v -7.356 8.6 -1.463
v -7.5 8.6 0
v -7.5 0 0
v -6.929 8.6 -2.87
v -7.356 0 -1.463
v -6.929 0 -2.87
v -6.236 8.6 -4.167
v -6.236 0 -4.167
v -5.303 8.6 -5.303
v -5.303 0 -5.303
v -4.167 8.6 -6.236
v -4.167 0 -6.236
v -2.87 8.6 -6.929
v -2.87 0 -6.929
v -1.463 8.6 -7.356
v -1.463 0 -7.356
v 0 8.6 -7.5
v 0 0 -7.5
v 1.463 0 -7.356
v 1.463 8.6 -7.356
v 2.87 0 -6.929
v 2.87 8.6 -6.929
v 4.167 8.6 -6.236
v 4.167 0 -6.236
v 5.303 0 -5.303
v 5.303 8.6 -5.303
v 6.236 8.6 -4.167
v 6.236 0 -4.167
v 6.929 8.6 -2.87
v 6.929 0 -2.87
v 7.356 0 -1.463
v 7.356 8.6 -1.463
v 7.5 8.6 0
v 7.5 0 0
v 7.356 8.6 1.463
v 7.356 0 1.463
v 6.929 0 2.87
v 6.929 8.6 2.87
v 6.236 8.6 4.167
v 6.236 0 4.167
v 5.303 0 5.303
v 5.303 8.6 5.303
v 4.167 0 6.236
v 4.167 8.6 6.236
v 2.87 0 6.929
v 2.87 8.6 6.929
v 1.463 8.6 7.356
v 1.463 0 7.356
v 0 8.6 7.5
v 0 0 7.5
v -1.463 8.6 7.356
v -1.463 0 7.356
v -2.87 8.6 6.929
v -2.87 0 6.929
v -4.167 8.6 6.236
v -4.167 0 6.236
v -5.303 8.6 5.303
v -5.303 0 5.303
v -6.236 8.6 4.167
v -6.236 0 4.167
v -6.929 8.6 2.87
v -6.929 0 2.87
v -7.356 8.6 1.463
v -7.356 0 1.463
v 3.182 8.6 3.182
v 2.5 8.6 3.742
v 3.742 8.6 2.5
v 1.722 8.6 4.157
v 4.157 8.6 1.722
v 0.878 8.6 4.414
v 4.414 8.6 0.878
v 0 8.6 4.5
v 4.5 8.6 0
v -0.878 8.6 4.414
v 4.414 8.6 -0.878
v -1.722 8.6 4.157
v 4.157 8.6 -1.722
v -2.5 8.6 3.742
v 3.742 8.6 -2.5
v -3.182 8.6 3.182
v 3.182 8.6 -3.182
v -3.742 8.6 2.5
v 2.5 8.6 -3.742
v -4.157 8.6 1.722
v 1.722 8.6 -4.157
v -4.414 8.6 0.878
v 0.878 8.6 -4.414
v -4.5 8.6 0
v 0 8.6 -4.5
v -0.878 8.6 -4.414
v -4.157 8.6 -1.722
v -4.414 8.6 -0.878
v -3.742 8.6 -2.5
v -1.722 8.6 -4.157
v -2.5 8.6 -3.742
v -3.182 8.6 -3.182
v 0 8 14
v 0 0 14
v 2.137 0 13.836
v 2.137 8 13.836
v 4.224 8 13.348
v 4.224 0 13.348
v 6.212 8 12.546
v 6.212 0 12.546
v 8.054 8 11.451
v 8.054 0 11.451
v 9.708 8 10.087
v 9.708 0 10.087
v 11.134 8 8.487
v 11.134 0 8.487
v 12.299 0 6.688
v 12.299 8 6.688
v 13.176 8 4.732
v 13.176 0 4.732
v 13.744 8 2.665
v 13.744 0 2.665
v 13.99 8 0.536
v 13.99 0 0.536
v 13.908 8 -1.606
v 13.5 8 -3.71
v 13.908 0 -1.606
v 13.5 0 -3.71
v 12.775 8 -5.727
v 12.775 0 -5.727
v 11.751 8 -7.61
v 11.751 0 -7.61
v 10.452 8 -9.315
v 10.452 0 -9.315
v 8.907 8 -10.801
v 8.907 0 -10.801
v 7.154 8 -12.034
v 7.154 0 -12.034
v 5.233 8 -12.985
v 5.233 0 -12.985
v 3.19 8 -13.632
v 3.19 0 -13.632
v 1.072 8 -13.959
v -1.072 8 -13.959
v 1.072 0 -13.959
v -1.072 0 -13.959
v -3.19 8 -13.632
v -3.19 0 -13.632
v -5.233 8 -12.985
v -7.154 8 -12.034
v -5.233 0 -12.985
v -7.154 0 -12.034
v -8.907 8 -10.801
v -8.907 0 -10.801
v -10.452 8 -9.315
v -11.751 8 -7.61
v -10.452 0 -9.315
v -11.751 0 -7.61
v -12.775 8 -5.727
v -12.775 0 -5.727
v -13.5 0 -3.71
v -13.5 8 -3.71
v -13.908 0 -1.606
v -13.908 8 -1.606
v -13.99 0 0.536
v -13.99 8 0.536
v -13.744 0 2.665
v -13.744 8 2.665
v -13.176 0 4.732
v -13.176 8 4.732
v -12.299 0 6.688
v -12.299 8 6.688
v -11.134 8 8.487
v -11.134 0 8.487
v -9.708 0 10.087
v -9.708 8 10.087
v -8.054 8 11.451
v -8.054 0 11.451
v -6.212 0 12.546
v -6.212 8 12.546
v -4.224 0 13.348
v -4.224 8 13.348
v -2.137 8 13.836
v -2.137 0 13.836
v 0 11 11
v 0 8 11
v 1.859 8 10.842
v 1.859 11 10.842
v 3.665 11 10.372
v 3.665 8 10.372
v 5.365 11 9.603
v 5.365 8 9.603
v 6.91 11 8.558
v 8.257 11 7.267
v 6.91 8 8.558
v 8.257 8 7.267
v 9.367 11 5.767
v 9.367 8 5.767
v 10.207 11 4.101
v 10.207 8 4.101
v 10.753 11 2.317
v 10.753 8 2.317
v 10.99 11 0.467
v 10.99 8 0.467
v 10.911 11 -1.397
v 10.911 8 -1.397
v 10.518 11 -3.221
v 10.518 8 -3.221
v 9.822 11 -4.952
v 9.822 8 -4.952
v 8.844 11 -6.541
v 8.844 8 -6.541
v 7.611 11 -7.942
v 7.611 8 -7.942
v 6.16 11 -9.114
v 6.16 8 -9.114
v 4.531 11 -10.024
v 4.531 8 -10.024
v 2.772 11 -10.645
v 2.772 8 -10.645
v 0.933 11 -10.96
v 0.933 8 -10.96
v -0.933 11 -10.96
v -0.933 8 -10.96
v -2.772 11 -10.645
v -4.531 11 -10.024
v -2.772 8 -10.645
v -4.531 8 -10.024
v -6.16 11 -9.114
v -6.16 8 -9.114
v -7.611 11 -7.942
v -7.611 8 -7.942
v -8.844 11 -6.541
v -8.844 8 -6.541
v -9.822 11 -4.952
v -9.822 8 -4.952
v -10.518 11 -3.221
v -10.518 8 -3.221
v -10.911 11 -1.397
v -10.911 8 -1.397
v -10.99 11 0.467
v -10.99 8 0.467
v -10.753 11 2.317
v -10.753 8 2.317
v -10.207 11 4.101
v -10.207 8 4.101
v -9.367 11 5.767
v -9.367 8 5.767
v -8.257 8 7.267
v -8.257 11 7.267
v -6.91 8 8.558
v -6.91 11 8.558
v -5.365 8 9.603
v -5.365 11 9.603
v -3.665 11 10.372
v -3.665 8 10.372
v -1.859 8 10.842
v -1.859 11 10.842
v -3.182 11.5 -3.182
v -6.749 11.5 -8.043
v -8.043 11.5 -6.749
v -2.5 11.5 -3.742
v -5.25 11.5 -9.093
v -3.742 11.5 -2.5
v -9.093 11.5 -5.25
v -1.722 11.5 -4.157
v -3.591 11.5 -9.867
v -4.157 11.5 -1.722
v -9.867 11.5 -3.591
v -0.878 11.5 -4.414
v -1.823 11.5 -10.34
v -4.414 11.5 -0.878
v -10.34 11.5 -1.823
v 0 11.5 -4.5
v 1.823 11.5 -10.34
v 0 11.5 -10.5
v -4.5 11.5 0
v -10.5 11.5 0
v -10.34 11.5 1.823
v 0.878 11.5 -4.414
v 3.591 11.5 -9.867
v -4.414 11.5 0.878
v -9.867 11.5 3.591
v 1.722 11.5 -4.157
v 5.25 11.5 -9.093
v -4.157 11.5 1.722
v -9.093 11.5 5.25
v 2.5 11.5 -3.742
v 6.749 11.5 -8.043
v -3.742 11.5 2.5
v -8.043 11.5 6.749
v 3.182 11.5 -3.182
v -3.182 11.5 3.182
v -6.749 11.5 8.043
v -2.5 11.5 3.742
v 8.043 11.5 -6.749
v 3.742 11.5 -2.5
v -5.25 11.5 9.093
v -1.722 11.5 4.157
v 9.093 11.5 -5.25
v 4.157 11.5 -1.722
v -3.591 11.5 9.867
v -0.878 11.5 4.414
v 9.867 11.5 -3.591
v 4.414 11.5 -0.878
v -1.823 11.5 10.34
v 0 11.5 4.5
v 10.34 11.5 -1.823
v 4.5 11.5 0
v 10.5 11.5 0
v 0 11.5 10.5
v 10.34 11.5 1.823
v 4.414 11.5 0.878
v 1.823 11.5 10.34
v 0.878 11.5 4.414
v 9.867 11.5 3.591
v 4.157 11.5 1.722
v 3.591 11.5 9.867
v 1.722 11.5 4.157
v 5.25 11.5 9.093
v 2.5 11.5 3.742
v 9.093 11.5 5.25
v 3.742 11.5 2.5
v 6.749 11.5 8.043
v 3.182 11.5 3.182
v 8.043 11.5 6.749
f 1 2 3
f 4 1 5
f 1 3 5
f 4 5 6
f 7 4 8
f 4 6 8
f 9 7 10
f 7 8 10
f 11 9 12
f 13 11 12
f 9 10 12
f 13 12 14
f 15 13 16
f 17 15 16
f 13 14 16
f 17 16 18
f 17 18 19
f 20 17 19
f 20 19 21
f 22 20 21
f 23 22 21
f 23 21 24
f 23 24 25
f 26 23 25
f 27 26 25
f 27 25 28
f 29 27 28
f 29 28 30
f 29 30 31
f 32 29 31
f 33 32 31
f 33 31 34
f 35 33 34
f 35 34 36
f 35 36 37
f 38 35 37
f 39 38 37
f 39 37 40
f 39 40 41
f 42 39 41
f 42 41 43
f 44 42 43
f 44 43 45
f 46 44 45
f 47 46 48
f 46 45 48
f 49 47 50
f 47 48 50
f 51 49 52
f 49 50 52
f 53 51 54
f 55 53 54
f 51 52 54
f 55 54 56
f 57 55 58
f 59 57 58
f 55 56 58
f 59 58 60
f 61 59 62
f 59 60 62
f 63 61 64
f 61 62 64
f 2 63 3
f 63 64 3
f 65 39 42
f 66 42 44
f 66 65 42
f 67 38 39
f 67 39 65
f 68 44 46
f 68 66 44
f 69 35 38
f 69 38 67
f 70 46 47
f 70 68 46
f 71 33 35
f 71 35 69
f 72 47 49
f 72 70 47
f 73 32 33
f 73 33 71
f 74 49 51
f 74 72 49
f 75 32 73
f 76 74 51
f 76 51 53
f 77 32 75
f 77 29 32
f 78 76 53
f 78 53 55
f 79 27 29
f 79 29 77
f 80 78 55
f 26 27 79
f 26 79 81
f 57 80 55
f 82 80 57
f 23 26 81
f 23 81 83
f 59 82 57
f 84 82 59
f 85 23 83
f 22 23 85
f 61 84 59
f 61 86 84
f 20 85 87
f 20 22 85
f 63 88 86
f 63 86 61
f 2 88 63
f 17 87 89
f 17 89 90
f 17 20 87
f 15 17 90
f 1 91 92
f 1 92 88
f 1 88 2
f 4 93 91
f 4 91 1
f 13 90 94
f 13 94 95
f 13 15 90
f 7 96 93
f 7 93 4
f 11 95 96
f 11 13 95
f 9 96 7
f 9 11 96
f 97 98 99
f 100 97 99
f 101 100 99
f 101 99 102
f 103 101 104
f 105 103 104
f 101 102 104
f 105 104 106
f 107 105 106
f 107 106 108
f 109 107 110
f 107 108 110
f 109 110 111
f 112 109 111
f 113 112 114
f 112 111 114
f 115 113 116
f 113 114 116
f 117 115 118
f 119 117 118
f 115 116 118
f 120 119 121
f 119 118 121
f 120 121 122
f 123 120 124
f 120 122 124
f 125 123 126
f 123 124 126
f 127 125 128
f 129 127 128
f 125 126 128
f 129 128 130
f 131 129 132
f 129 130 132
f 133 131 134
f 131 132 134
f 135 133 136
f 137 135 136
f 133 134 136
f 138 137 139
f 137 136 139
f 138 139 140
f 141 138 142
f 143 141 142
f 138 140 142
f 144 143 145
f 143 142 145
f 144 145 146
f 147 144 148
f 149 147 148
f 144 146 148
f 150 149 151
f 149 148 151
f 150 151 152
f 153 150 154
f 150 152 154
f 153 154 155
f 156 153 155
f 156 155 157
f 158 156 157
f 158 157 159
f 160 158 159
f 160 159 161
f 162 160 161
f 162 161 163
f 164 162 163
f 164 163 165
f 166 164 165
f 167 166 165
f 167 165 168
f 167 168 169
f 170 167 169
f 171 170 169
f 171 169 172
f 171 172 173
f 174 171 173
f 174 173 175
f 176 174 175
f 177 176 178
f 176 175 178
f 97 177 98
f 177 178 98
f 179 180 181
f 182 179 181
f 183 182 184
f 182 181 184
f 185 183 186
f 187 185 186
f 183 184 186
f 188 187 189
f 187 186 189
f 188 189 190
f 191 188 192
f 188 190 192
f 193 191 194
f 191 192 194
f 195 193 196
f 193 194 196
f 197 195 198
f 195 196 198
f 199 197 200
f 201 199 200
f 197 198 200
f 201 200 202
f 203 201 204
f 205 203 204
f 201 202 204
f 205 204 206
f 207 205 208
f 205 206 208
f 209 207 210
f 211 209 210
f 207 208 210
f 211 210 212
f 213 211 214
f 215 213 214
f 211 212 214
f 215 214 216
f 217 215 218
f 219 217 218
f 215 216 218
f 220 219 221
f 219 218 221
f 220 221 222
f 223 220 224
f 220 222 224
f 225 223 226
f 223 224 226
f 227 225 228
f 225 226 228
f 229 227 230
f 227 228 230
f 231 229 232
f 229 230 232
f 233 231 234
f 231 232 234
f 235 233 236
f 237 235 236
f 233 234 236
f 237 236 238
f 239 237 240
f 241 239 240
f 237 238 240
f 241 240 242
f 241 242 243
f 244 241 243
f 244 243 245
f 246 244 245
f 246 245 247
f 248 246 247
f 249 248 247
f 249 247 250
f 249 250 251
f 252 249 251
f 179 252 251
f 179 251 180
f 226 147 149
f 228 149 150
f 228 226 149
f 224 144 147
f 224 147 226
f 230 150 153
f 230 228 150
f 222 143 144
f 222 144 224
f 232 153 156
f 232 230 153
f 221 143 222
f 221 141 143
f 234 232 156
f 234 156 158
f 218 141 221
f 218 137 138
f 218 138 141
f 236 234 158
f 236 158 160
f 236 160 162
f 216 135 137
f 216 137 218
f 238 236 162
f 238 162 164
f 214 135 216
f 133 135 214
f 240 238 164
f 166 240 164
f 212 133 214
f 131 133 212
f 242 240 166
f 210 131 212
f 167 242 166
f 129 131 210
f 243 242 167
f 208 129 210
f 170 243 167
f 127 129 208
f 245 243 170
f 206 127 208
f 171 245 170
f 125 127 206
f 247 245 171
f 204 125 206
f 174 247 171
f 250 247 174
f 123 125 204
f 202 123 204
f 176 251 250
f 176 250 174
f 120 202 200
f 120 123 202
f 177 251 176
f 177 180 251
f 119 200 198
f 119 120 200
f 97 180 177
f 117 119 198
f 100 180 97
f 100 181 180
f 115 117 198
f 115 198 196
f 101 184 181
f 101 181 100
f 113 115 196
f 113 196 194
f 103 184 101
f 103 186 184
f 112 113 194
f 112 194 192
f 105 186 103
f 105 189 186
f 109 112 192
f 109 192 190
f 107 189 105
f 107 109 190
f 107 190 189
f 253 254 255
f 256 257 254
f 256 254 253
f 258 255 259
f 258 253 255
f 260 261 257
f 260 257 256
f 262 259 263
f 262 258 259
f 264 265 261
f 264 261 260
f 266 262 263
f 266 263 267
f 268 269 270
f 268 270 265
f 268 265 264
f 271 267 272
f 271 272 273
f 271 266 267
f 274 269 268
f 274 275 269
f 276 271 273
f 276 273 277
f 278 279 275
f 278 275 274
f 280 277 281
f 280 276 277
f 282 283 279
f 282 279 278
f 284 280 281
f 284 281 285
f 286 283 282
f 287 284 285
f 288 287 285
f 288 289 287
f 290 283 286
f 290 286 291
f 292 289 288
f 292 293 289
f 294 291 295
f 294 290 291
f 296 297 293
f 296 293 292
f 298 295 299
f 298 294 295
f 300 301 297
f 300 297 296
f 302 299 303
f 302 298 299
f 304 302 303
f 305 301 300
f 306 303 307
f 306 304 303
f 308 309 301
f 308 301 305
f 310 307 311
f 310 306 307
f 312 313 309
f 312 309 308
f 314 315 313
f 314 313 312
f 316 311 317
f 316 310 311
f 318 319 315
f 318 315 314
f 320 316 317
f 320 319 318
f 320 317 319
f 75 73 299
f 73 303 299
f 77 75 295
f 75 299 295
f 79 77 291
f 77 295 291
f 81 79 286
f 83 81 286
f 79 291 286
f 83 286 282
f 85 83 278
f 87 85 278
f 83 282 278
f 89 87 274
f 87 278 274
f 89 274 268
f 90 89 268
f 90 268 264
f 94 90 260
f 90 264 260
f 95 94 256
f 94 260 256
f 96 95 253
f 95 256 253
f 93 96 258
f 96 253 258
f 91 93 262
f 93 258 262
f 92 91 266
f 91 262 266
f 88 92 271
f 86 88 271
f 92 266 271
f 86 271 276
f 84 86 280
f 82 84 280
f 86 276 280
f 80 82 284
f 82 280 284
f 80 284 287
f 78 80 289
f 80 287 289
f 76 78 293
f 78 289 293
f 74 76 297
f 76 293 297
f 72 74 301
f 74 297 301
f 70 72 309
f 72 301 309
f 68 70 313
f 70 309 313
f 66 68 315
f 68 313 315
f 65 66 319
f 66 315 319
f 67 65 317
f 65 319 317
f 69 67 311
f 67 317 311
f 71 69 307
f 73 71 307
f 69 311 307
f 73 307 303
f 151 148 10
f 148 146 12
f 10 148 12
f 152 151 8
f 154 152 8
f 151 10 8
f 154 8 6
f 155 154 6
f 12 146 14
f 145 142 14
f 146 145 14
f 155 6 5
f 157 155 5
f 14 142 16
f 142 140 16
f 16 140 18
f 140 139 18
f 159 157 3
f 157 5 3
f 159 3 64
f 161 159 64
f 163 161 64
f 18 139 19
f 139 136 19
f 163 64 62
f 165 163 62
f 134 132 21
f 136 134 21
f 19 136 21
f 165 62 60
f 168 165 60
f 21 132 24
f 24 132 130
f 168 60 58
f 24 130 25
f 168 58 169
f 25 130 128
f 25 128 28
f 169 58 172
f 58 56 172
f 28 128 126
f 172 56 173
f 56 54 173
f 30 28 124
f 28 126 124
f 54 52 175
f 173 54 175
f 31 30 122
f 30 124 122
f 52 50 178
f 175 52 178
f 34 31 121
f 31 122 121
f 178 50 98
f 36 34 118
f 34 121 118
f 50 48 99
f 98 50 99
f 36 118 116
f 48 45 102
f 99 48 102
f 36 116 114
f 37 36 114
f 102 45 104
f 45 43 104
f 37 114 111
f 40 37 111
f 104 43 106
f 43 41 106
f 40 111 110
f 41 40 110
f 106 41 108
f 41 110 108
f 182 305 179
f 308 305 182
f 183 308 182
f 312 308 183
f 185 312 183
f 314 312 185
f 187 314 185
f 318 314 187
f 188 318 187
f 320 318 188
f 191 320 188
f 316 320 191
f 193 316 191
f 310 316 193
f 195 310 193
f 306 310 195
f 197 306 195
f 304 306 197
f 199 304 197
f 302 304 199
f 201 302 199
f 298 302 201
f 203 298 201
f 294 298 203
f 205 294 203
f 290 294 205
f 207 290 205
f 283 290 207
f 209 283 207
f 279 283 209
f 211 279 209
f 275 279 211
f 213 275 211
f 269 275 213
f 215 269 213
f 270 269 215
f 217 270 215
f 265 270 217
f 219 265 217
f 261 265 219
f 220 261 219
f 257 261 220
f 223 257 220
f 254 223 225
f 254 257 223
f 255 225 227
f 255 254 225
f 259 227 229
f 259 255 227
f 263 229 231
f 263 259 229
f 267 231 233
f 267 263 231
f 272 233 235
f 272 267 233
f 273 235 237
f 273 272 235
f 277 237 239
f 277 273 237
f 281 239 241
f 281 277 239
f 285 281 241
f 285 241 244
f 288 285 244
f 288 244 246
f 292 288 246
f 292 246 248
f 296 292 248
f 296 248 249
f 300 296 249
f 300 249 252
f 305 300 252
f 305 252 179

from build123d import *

# Parameters (mm, degrees)
SKETCH_1_R                   = 14
EXTRUDE_1_DEPTH              = 8
SKETCH_2_R                   = 11
EXTRUDE_2_DEPTH              = 3.5
HOLE_WIZARD_M8_1_D           = 9
HOLE_WIZARD_M8_1_CBORE_D     = 15
HOLE_WIZARD_M8_1_CBORE_DEPTH = 8.6
CHAMFER_1_SIZE               = 0.5


with BuildPart() as part:
    # 草圖1 → 填料-伸長1 (new body)
    with BuildSketch(Plane(origin=(0, 0, 0), x_dir=(1, 0, 0), z_dir=(0, 1, 0))):
        with Locations(Location((0, 0, 0), (0, 0, 270))):
            Circle(SKETCH_1_R)
    extrude(amount=EXTRUDE_1_DEPTH)

    # 草圖2 → 填料-伸長2 (add)
    with BuildSketch(Plane(origin=(0, 8, 0), x_dir=(1, 0, 0), z_dir=(0, 1, 0))):
        with Locations(Location((0, 0, 0), (0, 0, 270))):
            Circle(SKETCH_2_R)
    extrude(amount=EXTRUDE_2_DEPTH)

    # M8 六角承窩頭蓋螺釘的柱孔1 (through all)
    with Locations(Plane(origin=(0, 0, 0), x_dir=(-1, 0, 0), z_dir=(0, -1, 0))):
        with Locations((0, 0)):
            CounterBoreHole(HOLE_WIZARD_M8_1_D / 2, HOLE_WIZARD_M8_1_CBORE_D / 2, HOLE_WIZARD_M8_1_CBORE_DEPTH)

    # 導角1
    chamfer_1_edges = [part.edges().sort_by_distance(p)[0] for p in [
        (0, 11.5, -11),
    ]]
    chamfer(chamfer_1_edges, length=CHAMFER_1_SIZE)


solid = part.part
